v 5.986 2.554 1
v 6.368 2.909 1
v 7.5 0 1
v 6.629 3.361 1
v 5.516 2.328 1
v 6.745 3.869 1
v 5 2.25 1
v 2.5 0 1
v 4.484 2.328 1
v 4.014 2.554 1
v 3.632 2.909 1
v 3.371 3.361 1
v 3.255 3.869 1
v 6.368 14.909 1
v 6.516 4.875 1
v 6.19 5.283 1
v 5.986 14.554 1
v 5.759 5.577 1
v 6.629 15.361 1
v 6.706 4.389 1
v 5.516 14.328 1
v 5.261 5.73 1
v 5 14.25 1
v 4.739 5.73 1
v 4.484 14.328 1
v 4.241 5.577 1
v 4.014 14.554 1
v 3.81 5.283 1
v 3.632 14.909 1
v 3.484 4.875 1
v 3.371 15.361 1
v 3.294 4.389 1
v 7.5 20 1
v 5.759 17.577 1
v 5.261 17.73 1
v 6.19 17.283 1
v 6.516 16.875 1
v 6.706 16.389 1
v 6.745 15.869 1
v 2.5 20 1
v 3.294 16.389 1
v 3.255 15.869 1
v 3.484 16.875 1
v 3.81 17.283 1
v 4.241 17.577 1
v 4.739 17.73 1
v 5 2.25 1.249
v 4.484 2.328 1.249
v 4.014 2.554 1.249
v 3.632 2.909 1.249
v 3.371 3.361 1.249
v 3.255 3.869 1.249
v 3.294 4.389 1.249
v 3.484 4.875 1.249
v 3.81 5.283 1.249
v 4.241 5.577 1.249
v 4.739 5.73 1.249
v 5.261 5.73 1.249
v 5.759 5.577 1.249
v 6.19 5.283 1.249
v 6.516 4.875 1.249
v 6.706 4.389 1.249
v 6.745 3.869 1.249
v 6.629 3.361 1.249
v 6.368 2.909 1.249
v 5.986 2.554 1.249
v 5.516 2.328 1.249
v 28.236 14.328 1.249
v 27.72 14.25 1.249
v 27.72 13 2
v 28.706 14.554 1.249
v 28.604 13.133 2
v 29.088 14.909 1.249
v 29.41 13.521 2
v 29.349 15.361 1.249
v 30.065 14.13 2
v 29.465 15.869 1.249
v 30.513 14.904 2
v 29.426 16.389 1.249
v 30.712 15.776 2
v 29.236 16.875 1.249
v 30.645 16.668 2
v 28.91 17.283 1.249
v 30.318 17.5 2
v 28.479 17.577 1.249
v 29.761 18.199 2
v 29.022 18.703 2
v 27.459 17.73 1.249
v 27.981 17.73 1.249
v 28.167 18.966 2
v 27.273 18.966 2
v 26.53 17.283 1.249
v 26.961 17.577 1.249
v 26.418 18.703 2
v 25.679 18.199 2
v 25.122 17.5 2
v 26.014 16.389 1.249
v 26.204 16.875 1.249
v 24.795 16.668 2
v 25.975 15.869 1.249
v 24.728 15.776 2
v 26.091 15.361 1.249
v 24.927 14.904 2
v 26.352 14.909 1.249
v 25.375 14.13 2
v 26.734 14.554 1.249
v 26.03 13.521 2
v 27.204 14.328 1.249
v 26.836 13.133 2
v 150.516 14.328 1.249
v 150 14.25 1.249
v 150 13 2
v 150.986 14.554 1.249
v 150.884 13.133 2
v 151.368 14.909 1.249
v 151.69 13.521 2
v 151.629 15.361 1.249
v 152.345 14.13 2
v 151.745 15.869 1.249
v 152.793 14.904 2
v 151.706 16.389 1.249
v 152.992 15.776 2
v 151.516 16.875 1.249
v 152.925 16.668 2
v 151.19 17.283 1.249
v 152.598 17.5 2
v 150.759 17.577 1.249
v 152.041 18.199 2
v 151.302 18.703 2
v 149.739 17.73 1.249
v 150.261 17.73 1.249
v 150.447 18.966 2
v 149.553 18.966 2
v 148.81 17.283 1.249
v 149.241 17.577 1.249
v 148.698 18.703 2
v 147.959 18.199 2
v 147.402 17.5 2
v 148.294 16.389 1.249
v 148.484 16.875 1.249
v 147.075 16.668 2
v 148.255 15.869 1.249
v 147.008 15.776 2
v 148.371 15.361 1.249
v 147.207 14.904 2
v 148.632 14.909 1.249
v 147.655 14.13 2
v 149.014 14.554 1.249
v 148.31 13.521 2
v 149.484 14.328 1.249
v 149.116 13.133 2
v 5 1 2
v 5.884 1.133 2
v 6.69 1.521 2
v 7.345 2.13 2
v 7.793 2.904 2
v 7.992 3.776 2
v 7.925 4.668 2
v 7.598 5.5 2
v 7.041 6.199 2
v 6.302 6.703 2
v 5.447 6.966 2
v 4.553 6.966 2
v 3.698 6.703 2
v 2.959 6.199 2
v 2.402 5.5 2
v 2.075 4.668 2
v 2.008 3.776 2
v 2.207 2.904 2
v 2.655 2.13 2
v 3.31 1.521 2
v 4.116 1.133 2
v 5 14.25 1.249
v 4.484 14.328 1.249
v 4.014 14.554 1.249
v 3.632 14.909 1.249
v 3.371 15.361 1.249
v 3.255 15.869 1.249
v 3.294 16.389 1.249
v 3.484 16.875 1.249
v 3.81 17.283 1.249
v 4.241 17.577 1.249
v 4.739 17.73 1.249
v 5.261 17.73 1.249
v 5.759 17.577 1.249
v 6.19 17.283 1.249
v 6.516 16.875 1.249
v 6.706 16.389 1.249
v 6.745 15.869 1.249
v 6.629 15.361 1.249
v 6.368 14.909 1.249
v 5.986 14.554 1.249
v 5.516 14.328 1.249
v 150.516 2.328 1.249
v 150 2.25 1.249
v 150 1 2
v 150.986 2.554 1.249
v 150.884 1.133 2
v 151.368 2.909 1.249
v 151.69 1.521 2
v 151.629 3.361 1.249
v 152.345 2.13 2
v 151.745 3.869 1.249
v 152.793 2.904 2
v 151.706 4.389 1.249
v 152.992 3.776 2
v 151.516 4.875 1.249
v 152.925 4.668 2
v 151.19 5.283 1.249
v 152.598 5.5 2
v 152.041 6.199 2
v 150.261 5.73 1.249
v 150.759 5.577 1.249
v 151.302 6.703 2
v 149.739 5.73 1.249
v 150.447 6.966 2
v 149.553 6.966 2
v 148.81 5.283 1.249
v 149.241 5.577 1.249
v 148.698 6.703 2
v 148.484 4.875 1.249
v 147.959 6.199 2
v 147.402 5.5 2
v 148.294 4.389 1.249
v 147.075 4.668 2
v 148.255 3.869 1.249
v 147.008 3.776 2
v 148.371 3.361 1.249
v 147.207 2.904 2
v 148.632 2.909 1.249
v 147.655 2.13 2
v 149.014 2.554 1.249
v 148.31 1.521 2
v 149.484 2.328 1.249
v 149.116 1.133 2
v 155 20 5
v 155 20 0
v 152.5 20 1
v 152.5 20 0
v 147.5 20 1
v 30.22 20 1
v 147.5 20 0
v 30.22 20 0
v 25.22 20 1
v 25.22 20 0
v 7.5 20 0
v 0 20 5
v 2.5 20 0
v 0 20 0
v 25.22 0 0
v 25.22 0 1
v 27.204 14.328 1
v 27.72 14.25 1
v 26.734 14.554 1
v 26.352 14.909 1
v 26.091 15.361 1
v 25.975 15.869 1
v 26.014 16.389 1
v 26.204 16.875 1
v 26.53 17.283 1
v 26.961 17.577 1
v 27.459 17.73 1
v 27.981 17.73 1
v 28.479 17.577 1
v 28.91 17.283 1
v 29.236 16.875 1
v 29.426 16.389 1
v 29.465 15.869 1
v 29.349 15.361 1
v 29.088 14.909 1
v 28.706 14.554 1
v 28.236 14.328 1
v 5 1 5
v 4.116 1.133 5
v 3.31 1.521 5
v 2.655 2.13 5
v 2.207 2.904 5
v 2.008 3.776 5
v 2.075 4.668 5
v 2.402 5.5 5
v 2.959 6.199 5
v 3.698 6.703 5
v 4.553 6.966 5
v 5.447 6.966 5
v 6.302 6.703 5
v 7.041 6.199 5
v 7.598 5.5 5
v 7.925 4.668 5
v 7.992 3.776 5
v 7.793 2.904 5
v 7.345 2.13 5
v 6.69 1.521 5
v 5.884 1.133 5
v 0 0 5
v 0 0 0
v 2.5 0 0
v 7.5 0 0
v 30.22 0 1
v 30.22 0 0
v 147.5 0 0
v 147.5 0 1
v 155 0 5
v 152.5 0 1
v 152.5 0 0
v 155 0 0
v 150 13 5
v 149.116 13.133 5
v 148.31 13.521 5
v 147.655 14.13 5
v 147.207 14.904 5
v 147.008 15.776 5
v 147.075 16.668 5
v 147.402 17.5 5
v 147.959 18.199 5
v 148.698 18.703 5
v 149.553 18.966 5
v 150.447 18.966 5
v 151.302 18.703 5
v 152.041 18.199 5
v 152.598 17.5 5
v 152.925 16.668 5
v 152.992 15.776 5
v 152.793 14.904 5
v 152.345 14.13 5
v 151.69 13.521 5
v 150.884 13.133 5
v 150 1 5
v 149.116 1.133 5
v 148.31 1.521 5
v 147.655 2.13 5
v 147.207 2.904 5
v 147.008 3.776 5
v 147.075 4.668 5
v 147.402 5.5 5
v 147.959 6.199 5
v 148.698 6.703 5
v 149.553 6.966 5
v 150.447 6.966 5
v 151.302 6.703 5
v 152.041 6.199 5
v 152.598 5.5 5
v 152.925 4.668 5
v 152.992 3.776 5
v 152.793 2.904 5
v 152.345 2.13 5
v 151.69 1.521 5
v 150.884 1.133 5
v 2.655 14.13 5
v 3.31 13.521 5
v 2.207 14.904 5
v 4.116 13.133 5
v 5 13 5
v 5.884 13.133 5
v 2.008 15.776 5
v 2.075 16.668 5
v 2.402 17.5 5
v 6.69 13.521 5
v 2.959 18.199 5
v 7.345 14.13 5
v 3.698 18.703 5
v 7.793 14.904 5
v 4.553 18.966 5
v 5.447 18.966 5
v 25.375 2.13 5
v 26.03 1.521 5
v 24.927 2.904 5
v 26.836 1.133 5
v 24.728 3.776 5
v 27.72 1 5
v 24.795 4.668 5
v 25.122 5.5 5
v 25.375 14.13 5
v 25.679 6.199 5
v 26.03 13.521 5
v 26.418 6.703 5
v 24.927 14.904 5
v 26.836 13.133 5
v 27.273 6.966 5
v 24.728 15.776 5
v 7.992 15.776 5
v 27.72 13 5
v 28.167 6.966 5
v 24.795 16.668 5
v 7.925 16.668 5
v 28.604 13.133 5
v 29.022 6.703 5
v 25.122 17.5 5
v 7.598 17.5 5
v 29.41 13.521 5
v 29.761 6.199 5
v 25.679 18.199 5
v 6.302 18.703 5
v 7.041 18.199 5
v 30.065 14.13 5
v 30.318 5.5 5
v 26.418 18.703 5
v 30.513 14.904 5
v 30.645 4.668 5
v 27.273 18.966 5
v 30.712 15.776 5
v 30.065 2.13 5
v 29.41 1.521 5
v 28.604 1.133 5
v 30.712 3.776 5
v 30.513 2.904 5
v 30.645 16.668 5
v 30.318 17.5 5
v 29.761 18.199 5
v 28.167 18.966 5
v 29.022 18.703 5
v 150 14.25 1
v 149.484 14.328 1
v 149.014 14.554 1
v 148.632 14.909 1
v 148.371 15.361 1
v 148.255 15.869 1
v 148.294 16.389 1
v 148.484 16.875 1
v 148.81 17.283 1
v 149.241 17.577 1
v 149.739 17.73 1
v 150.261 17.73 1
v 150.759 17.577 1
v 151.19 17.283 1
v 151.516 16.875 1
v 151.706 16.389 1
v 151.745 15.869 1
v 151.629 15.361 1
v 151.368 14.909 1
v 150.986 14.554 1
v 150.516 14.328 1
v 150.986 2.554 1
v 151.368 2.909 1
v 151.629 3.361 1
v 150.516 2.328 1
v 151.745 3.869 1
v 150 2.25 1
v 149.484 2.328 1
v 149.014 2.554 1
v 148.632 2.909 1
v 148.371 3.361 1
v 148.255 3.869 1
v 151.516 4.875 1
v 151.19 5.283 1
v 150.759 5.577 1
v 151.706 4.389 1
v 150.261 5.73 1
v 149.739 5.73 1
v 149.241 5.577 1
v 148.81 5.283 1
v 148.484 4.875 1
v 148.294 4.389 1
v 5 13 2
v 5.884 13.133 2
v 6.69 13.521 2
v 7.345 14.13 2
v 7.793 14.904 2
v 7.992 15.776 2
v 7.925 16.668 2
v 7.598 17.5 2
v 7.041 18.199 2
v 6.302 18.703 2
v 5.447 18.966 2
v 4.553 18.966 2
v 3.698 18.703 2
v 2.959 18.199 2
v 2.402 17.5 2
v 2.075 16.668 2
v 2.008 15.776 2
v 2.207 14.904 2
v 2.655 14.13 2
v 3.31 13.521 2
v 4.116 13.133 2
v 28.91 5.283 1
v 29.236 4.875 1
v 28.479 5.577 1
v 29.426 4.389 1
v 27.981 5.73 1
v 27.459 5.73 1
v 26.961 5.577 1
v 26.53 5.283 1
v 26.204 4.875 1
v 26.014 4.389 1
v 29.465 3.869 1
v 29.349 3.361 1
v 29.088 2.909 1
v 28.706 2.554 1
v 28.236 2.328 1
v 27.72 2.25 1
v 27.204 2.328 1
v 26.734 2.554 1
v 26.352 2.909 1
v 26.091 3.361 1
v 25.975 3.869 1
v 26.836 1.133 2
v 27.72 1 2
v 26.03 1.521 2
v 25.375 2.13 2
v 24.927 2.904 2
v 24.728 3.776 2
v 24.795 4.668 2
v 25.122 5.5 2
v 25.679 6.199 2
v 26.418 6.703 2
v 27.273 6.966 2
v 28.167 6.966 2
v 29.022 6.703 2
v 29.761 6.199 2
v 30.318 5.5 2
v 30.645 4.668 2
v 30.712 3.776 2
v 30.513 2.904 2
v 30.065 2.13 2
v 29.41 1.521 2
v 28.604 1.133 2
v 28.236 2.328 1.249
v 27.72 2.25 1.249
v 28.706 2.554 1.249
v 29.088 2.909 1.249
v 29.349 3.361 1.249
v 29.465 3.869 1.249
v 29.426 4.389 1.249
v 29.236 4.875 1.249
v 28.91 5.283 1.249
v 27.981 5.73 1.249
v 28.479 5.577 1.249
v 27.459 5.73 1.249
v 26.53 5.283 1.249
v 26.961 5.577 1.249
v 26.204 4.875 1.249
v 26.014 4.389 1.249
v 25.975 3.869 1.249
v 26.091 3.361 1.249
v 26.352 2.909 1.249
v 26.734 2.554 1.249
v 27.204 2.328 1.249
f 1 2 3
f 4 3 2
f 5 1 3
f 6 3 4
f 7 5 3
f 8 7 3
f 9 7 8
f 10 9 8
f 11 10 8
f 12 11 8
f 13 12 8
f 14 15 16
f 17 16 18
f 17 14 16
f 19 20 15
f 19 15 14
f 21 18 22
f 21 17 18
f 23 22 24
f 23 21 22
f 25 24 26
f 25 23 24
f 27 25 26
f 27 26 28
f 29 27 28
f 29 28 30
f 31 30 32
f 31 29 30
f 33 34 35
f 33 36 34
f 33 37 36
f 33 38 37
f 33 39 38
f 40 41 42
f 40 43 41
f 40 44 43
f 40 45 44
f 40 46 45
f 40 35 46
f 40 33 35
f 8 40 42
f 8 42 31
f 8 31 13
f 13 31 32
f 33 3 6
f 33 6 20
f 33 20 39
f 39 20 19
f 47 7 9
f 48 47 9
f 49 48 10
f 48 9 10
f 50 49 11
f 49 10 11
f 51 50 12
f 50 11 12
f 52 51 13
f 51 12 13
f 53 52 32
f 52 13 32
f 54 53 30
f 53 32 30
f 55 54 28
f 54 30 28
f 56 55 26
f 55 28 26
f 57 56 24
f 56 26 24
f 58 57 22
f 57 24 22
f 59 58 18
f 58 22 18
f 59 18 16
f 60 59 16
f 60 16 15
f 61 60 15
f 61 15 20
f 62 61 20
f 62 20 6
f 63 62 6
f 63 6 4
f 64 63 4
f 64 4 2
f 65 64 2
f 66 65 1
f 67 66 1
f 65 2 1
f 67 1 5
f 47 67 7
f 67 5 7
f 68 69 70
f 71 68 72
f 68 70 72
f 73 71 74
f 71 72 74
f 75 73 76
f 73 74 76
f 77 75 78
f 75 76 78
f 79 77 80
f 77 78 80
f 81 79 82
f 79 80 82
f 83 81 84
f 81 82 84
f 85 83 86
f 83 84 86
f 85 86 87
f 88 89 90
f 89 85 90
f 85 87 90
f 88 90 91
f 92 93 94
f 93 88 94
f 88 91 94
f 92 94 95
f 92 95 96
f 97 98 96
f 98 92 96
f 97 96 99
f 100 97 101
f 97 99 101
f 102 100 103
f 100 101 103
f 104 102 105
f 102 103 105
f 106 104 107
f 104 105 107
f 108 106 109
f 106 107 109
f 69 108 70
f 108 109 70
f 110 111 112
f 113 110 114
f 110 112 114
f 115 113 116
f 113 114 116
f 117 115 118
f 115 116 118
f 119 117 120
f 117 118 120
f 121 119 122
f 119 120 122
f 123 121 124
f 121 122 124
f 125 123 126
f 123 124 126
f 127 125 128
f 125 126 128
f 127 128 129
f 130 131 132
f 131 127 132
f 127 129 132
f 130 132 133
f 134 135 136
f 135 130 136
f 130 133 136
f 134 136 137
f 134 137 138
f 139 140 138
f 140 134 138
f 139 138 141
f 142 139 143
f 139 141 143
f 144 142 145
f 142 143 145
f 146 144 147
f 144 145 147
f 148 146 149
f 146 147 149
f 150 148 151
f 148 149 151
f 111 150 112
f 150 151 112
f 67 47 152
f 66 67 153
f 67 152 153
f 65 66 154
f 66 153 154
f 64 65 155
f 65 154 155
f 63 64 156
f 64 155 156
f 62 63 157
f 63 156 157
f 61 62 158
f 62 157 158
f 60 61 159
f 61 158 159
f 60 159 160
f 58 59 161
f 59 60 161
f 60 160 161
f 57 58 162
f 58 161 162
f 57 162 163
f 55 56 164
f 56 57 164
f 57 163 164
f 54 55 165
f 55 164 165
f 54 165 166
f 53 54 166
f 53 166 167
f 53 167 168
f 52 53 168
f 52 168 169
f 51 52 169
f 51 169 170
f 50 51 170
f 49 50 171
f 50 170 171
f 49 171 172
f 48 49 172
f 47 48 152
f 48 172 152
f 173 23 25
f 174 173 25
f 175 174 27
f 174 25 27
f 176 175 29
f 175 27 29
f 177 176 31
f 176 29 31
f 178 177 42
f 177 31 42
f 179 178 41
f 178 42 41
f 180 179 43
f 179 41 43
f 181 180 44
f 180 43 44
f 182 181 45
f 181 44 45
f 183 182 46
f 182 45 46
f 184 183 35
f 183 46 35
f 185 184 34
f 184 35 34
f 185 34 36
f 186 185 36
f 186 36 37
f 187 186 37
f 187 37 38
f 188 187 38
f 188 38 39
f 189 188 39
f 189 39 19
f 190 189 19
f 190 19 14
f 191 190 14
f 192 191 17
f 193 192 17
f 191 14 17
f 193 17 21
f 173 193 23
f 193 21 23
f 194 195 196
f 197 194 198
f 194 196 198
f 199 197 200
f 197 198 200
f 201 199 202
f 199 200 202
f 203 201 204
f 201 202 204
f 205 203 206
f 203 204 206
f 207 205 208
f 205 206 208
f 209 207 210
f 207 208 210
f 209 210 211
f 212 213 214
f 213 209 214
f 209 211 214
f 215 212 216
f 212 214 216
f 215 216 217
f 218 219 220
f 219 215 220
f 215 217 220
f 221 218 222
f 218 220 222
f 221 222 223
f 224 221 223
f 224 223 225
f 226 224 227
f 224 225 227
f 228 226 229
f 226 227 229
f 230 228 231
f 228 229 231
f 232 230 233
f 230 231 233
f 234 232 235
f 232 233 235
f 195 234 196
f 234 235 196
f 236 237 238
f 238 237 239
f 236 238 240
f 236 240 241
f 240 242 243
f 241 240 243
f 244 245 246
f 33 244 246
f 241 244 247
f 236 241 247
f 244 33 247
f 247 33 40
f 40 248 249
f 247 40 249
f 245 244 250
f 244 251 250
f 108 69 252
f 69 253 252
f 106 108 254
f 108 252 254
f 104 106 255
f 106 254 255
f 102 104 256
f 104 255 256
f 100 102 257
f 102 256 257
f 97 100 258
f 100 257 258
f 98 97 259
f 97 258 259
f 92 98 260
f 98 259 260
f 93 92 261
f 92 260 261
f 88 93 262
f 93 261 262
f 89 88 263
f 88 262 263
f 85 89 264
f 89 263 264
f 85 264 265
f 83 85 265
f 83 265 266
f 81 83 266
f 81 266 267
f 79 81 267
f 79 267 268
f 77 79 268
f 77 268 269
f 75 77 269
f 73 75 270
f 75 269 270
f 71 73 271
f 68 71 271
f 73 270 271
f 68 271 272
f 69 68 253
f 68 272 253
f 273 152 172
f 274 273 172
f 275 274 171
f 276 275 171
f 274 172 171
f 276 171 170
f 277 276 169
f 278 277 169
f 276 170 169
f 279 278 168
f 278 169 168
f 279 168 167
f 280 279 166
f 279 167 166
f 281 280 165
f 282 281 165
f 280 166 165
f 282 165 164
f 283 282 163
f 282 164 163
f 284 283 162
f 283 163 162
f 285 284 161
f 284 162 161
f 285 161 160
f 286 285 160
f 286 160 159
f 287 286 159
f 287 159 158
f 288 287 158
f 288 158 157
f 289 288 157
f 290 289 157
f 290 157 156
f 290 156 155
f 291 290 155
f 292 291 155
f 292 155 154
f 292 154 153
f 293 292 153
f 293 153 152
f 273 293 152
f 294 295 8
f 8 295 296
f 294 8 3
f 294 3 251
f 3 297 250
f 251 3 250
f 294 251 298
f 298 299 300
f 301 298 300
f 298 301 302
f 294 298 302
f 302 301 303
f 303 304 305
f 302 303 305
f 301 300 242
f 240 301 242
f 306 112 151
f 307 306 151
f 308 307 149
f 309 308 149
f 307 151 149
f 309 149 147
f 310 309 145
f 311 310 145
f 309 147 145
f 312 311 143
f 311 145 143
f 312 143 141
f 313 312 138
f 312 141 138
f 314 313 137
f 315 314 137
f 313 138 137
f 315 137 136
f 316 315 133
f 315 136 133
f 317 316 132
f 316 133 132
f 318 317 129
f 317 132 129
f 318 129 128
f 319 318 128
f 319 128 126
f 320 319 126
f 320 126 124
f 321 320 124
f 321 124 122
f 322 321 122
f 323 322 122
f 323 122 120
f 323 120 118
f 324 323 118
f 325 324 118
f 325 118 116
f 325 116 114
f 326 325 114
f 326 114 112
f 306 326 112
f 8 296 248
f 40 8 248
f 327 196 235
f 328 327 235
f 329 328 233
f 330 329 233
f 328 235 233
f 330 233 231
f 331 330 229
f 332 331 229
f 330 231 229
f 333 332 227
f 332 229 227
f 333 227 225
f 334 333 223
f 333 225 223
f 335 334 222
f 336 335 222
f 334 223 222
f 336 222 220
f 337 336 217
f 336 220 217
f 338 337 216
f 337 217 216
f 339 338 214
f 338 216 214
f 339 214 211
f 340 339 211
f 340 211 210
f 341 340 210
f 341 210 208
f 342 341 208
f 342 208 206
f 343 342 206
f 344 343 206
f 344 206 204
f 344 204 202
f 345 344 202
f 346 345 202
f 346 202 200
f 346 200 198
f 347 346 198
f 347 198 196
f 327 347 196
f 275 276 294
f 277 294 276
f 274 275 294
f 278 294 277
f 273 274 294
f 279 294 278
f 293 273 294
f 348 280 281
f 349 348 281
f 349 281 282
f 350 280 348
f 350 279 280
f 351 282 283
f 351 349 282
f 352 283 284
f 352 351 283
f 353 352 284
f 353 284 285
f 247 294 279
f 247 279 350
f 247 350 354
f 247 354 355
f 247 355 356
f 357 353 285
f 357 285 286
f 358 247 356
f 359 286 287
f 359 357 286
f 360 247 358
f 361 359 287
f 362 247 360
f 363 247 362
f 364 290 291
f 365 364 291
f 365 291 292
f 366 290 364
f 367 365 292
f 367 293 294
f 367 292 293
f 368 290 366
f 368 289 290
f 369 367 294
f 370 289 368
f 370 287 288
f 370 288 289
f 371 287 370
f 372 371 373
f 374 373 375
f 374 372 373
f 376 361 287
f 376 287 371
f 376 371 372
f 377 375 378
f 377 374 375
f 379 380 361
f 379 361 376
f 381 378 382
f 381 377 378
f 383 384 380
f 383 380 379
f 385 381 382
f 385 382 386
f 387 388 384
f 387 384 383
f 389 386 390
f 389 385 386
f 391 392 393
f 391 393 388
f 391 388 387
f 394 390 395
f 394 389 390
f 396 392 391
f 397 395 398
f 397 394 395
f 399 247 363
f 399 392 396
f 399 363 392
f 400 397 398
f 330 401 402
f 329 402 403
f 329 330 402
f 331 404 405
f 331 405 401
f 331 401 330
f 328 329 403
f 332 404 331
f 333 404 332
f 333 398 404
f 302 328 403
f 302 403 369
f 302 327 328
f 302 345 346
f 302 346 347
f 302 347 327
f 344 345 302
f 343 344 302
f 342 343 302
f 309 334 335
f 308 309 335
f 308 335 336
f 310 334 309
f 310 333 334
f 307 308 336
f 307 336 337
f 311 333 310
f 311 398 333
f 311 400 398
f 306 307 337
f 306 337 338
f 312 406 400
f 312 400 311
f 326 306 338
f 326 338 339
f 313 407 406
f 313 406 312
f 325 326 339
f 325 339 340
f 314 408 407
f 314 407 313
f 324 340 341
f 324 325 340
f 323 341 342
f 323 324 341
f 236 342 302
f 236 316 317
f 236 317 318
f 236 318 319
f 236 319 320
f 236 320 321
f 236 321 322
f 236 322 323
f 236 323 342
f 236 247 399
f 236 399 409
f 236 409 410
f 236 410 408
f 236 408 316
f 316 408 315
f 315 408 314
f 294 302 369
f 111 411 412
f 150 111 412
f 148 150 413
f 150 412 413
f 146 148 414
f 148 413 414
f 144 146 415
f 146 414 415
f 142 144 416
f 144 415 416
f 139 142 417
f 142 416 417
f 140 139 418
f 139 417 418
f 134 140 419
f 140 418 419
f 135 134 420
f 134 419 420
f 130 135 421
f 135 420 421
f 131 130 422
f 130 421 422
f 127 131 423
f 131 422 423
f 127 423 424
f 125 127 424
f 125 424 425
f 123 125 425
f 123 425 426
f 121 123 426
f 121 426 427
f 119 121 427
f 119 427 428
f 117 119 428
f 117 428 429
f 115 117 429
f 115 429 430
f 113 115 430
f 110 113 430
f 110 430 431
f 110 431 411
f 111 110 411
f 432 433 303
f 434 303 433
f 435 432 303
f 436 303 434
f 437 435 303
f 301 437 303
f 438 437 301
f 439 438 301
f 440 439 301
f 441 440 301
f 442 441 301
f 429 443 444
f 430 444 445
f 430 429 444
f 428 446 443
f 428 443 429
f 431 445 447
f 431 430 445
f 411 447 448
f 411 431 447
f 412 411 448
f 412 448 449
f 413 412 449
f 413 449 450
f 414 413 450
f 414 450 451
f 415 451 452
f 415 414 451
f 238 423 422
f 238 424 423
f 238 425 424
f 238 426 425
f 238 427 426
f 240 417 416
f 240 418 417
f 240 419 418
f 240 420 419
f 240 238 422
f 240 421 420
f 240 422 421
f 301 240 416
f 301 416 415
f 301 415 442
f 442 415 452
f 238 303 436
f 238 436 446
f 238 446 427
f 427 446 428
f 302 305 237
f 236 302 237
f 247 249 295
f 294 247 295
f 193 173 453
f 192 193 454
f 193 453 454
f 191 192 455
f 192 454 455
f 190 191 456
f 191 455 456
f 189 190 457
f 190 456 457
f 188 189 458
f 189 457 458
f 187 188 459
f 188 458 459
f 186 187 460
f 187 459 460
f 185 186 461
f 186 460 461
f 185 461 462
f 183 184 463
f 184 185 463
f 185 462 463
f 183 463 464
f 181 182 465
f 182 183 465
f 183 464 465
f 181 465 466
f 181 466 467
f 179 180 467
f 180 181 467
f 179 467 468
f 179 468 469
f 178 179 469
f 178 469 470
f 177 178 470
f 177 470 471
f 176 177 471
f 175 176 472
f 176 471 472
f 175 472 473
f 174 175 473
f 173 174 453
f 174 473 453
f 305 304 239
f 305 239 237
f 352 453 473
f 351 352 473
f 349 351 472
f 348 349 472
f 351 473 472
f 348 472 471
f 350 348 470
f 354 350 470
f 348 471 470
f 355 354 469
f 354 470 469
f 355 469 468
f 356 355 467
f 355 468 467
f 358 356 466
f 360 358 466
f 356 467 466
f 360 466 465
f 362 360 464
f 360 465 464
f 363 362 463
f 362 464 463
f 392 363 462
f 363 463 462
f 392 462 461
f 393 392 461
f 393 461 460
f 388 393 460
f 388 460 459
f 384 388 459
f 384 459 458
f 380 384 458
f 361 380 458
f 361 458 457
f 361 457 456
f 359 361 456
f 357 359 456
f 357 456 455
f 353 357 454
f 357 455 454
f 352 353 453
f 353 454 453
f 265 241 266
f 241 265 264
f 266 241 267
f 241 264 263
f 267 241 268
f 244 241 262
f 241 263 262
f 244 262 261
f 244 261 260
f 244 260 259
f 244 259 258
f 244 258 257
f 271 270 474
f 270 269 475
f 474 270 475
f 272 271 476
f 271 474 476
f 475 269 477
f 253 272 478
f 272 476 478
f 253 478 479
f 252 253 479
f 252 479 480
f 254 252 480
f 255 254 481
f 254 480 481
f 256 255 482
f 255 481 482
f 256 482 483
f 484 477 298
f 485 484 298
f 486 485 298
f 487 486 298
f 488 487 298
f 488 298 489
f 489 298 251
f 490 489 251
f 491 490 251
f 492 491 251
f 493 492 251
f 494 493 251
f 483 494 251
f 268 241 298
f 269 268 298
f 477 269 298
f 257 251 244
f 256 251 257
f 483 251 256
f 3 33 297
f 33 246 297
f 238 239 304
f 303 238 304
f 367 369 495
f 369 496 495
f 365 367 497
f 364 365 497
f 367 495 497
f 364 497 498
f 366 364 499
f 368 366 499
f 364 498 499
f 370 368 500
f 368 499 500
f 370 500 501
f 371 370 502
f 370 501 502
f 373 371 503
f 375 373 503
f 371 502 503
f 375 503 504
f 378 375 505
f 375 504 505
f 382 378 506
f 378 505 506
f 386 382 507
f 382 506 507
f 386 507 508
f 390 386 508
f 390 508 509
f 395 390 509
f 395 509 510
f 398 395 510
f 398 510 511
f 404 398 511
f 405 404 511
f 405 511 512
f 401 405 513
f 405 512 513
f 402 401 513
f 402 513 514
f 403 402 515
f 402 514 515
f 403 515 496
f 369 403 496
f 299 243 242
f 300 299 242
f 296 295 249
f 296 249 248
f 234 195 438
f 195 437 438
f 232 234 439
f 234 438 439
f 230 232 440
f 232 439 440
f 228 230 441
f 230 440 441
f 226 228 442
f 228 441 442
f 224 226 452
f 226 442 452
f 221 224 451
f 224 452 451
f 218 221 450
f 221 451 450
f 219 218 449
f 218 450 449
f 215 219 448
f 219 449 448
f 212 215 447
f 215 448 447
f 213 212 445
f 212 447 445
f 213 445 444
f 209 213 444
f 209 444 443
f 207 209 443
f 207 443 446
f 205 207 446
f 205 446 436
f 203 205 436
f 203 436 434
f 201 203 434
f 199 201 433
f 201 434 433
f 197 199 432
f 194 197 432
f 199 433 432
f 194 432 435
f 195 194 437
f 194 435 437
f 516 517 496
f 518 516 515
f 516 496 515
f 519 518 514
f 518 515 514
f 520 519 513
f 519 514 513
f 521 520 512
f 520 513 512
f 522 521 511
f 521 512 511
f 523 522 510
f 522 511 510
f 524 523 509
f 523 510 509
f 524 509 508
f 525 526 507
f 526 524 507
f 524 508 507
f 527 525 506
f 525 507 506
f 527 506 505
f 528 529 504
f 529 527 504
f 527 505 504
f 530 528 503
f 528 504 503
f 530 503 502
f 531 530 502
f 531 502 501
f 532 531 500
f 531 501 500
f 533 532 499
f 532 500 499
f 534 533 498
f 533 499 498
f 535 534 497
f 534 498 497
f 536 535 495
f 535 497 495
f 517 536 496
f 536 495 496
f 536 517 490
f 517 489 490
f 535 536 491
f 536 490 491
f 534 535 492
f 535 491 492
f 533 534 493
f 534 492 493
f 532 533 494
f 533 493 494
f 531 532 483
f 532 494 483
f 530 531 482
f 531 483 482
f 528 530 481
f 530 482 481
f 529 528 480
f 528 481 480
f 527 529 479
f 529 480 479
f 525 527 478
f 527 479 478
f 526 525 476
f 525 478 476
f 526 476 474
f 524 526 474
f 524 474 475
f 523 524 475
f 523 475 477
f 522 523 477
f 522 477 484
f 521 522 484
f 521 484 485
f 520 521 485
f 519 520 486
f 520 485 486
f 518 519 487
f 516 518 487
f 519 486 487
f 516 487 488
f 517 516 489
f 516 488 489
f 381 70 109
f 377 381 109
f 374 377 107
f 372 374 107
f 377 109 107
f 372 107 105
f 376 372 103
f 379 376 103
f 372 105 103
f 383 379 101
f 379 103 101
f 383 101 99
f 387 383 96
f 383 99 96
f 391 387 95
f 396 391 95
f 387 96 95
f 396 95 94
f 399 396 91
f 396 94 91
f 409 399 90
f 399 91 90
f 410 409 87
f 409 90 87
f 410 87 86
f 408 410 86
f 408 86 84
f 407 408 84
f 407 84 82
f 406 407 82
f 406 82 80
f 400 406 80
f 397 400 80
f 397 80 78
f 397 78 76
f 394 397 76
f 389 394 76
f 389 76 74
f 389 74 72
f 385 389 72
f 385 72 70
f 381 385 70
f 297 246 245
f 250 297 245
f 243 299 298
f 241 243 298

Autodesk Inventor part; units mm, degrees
ref_plane "YZ Plane" through (0, 0, 0) normal (1, 0, 0) x (0, 1, 0)
ref_plane "XZ Plane" through (0, 0, 0) normal (0, 1, 0) x (-1, 0, 0)
ref_plane "XY Plane" through (0, 0, 0) normal (0, 0, 1) x (1, 0, 0)
sketch "スケッチ1" plane through (0, 0, 0) normal (0, 0, 1) x (1, 0, 0)
  line L0 (0, 0) -> (155, 0)
  line L1 (155, 0) -> (155, 20)
  line L2 (155, 20) -> (0, 20)
  line L3 (0, 20) -> (0, 0)
  dimension "d0" = 155
  dimension "d1" = 20
extrude "押し出し1" add sketch "スケッチ1" along normal blind 5
sketch "スケッチ2" plane through (0, 0, 0) normal (0, 0, -1) x (-1, 0, 0)
  line L0 (-155, 0) -> (-155, 20) projected
  line L1 (0, 0) -> (-155, 0) projected
  line L2 (0, 20) -> (0, 0) projected
  line L3 (-155, 20) -> (0, 20) projected
  line L4 (-2.5, 20) -> (-7.5, 20)
  line L5 (-7.5, 20) -> (-7.5, 0)
  line L6 (-7.5, 0) -> (-2.5, 0)
  line L7 (-2.5, 0) -> (-2.5, 20)
  line L8 (-152.5, 0) -> (-147.5, 0)
  line L9 (-147.5, 0) -> (-147.5, 20)
  line L10 (-147.5, 20) -> (-152.5, 20)
  line L11 (-152.5, 20) -> (-152.5, 0)
  dimension "d4" = 5
  dimension "d5" = 2.5
  dimension "d6" = 5
  dimension "d7" = 2.5
extrude "押し出し2" cut sketch "スケッチ2" against normal blind 1 contours L11 L3 L9 L1 | L5 L3 L7 L1
sketch "スケッチ3" plane through (0, 0, 5) normal (0, -1, 0) x (1, 0, 0)
  line L0 (30.22, -4) -> (25.22, -4) projected
  line L1 (25.22, -4) -> (25.22, -356) projected
  line L2 (25.22, -356) -> (30.22, -356) projected
  line L3 (30.22, -356) -> (30.22, -4) projected
extrude "押し出し3" cut sketch "スケッチ3" against normal through all
sketch "スケッチ4" plane through (0, 0, 5) normal (0, 0, 1) x (1, 0, 0)
  circle A0 centre (5, 16) radius 1.2
  circle A1 centre (5, 4) radius 1.2
  circle A2 centre (27.72, 4) radius 1.2
  circle A3 centre (27.72, 16) radius 1.2
  circle A4 centre (150, 16) radius 1.2
  circle A5 centre (150, 4) radius 1.2
hole "穴1" at (5, 4, 5) at (5, 16, 5) at (27.72, 16, 5) at (27.72, 4, 5) at (150, 16, 5) at (150, 4, 5) direction (0, 0, -1) diameter 3.5 end through all
sketch "スケッチ5" plane through (0, 0, 5) normal (0, 0, 1) x (1, 0, 0)
  circle A0 centre (150, 16) radius 1.75 projected
  circle A1 centre (27.72, 16) radius 1.75 projected
  circle A2 centre (5, 4) radius 1.75 projected
  circle A3 centre (5, 16) radius 1.75 projected
  circle A4 centre (27.72, 4) radius 1.75 projected
  circle A5 centre (150, 4) radius 1.75 projected
hole "穴2" at (5, 4, 5) at (5, 16, 5) at (27.72, 4, 5) at (27.72, 16, 5) at (150, 16, 5) at (150, 4, 5) direction (0, 0, -1) diameter 6 depth 3 tip angle 118
properties part number "arm1_S" material "アルミニウム 6061"
